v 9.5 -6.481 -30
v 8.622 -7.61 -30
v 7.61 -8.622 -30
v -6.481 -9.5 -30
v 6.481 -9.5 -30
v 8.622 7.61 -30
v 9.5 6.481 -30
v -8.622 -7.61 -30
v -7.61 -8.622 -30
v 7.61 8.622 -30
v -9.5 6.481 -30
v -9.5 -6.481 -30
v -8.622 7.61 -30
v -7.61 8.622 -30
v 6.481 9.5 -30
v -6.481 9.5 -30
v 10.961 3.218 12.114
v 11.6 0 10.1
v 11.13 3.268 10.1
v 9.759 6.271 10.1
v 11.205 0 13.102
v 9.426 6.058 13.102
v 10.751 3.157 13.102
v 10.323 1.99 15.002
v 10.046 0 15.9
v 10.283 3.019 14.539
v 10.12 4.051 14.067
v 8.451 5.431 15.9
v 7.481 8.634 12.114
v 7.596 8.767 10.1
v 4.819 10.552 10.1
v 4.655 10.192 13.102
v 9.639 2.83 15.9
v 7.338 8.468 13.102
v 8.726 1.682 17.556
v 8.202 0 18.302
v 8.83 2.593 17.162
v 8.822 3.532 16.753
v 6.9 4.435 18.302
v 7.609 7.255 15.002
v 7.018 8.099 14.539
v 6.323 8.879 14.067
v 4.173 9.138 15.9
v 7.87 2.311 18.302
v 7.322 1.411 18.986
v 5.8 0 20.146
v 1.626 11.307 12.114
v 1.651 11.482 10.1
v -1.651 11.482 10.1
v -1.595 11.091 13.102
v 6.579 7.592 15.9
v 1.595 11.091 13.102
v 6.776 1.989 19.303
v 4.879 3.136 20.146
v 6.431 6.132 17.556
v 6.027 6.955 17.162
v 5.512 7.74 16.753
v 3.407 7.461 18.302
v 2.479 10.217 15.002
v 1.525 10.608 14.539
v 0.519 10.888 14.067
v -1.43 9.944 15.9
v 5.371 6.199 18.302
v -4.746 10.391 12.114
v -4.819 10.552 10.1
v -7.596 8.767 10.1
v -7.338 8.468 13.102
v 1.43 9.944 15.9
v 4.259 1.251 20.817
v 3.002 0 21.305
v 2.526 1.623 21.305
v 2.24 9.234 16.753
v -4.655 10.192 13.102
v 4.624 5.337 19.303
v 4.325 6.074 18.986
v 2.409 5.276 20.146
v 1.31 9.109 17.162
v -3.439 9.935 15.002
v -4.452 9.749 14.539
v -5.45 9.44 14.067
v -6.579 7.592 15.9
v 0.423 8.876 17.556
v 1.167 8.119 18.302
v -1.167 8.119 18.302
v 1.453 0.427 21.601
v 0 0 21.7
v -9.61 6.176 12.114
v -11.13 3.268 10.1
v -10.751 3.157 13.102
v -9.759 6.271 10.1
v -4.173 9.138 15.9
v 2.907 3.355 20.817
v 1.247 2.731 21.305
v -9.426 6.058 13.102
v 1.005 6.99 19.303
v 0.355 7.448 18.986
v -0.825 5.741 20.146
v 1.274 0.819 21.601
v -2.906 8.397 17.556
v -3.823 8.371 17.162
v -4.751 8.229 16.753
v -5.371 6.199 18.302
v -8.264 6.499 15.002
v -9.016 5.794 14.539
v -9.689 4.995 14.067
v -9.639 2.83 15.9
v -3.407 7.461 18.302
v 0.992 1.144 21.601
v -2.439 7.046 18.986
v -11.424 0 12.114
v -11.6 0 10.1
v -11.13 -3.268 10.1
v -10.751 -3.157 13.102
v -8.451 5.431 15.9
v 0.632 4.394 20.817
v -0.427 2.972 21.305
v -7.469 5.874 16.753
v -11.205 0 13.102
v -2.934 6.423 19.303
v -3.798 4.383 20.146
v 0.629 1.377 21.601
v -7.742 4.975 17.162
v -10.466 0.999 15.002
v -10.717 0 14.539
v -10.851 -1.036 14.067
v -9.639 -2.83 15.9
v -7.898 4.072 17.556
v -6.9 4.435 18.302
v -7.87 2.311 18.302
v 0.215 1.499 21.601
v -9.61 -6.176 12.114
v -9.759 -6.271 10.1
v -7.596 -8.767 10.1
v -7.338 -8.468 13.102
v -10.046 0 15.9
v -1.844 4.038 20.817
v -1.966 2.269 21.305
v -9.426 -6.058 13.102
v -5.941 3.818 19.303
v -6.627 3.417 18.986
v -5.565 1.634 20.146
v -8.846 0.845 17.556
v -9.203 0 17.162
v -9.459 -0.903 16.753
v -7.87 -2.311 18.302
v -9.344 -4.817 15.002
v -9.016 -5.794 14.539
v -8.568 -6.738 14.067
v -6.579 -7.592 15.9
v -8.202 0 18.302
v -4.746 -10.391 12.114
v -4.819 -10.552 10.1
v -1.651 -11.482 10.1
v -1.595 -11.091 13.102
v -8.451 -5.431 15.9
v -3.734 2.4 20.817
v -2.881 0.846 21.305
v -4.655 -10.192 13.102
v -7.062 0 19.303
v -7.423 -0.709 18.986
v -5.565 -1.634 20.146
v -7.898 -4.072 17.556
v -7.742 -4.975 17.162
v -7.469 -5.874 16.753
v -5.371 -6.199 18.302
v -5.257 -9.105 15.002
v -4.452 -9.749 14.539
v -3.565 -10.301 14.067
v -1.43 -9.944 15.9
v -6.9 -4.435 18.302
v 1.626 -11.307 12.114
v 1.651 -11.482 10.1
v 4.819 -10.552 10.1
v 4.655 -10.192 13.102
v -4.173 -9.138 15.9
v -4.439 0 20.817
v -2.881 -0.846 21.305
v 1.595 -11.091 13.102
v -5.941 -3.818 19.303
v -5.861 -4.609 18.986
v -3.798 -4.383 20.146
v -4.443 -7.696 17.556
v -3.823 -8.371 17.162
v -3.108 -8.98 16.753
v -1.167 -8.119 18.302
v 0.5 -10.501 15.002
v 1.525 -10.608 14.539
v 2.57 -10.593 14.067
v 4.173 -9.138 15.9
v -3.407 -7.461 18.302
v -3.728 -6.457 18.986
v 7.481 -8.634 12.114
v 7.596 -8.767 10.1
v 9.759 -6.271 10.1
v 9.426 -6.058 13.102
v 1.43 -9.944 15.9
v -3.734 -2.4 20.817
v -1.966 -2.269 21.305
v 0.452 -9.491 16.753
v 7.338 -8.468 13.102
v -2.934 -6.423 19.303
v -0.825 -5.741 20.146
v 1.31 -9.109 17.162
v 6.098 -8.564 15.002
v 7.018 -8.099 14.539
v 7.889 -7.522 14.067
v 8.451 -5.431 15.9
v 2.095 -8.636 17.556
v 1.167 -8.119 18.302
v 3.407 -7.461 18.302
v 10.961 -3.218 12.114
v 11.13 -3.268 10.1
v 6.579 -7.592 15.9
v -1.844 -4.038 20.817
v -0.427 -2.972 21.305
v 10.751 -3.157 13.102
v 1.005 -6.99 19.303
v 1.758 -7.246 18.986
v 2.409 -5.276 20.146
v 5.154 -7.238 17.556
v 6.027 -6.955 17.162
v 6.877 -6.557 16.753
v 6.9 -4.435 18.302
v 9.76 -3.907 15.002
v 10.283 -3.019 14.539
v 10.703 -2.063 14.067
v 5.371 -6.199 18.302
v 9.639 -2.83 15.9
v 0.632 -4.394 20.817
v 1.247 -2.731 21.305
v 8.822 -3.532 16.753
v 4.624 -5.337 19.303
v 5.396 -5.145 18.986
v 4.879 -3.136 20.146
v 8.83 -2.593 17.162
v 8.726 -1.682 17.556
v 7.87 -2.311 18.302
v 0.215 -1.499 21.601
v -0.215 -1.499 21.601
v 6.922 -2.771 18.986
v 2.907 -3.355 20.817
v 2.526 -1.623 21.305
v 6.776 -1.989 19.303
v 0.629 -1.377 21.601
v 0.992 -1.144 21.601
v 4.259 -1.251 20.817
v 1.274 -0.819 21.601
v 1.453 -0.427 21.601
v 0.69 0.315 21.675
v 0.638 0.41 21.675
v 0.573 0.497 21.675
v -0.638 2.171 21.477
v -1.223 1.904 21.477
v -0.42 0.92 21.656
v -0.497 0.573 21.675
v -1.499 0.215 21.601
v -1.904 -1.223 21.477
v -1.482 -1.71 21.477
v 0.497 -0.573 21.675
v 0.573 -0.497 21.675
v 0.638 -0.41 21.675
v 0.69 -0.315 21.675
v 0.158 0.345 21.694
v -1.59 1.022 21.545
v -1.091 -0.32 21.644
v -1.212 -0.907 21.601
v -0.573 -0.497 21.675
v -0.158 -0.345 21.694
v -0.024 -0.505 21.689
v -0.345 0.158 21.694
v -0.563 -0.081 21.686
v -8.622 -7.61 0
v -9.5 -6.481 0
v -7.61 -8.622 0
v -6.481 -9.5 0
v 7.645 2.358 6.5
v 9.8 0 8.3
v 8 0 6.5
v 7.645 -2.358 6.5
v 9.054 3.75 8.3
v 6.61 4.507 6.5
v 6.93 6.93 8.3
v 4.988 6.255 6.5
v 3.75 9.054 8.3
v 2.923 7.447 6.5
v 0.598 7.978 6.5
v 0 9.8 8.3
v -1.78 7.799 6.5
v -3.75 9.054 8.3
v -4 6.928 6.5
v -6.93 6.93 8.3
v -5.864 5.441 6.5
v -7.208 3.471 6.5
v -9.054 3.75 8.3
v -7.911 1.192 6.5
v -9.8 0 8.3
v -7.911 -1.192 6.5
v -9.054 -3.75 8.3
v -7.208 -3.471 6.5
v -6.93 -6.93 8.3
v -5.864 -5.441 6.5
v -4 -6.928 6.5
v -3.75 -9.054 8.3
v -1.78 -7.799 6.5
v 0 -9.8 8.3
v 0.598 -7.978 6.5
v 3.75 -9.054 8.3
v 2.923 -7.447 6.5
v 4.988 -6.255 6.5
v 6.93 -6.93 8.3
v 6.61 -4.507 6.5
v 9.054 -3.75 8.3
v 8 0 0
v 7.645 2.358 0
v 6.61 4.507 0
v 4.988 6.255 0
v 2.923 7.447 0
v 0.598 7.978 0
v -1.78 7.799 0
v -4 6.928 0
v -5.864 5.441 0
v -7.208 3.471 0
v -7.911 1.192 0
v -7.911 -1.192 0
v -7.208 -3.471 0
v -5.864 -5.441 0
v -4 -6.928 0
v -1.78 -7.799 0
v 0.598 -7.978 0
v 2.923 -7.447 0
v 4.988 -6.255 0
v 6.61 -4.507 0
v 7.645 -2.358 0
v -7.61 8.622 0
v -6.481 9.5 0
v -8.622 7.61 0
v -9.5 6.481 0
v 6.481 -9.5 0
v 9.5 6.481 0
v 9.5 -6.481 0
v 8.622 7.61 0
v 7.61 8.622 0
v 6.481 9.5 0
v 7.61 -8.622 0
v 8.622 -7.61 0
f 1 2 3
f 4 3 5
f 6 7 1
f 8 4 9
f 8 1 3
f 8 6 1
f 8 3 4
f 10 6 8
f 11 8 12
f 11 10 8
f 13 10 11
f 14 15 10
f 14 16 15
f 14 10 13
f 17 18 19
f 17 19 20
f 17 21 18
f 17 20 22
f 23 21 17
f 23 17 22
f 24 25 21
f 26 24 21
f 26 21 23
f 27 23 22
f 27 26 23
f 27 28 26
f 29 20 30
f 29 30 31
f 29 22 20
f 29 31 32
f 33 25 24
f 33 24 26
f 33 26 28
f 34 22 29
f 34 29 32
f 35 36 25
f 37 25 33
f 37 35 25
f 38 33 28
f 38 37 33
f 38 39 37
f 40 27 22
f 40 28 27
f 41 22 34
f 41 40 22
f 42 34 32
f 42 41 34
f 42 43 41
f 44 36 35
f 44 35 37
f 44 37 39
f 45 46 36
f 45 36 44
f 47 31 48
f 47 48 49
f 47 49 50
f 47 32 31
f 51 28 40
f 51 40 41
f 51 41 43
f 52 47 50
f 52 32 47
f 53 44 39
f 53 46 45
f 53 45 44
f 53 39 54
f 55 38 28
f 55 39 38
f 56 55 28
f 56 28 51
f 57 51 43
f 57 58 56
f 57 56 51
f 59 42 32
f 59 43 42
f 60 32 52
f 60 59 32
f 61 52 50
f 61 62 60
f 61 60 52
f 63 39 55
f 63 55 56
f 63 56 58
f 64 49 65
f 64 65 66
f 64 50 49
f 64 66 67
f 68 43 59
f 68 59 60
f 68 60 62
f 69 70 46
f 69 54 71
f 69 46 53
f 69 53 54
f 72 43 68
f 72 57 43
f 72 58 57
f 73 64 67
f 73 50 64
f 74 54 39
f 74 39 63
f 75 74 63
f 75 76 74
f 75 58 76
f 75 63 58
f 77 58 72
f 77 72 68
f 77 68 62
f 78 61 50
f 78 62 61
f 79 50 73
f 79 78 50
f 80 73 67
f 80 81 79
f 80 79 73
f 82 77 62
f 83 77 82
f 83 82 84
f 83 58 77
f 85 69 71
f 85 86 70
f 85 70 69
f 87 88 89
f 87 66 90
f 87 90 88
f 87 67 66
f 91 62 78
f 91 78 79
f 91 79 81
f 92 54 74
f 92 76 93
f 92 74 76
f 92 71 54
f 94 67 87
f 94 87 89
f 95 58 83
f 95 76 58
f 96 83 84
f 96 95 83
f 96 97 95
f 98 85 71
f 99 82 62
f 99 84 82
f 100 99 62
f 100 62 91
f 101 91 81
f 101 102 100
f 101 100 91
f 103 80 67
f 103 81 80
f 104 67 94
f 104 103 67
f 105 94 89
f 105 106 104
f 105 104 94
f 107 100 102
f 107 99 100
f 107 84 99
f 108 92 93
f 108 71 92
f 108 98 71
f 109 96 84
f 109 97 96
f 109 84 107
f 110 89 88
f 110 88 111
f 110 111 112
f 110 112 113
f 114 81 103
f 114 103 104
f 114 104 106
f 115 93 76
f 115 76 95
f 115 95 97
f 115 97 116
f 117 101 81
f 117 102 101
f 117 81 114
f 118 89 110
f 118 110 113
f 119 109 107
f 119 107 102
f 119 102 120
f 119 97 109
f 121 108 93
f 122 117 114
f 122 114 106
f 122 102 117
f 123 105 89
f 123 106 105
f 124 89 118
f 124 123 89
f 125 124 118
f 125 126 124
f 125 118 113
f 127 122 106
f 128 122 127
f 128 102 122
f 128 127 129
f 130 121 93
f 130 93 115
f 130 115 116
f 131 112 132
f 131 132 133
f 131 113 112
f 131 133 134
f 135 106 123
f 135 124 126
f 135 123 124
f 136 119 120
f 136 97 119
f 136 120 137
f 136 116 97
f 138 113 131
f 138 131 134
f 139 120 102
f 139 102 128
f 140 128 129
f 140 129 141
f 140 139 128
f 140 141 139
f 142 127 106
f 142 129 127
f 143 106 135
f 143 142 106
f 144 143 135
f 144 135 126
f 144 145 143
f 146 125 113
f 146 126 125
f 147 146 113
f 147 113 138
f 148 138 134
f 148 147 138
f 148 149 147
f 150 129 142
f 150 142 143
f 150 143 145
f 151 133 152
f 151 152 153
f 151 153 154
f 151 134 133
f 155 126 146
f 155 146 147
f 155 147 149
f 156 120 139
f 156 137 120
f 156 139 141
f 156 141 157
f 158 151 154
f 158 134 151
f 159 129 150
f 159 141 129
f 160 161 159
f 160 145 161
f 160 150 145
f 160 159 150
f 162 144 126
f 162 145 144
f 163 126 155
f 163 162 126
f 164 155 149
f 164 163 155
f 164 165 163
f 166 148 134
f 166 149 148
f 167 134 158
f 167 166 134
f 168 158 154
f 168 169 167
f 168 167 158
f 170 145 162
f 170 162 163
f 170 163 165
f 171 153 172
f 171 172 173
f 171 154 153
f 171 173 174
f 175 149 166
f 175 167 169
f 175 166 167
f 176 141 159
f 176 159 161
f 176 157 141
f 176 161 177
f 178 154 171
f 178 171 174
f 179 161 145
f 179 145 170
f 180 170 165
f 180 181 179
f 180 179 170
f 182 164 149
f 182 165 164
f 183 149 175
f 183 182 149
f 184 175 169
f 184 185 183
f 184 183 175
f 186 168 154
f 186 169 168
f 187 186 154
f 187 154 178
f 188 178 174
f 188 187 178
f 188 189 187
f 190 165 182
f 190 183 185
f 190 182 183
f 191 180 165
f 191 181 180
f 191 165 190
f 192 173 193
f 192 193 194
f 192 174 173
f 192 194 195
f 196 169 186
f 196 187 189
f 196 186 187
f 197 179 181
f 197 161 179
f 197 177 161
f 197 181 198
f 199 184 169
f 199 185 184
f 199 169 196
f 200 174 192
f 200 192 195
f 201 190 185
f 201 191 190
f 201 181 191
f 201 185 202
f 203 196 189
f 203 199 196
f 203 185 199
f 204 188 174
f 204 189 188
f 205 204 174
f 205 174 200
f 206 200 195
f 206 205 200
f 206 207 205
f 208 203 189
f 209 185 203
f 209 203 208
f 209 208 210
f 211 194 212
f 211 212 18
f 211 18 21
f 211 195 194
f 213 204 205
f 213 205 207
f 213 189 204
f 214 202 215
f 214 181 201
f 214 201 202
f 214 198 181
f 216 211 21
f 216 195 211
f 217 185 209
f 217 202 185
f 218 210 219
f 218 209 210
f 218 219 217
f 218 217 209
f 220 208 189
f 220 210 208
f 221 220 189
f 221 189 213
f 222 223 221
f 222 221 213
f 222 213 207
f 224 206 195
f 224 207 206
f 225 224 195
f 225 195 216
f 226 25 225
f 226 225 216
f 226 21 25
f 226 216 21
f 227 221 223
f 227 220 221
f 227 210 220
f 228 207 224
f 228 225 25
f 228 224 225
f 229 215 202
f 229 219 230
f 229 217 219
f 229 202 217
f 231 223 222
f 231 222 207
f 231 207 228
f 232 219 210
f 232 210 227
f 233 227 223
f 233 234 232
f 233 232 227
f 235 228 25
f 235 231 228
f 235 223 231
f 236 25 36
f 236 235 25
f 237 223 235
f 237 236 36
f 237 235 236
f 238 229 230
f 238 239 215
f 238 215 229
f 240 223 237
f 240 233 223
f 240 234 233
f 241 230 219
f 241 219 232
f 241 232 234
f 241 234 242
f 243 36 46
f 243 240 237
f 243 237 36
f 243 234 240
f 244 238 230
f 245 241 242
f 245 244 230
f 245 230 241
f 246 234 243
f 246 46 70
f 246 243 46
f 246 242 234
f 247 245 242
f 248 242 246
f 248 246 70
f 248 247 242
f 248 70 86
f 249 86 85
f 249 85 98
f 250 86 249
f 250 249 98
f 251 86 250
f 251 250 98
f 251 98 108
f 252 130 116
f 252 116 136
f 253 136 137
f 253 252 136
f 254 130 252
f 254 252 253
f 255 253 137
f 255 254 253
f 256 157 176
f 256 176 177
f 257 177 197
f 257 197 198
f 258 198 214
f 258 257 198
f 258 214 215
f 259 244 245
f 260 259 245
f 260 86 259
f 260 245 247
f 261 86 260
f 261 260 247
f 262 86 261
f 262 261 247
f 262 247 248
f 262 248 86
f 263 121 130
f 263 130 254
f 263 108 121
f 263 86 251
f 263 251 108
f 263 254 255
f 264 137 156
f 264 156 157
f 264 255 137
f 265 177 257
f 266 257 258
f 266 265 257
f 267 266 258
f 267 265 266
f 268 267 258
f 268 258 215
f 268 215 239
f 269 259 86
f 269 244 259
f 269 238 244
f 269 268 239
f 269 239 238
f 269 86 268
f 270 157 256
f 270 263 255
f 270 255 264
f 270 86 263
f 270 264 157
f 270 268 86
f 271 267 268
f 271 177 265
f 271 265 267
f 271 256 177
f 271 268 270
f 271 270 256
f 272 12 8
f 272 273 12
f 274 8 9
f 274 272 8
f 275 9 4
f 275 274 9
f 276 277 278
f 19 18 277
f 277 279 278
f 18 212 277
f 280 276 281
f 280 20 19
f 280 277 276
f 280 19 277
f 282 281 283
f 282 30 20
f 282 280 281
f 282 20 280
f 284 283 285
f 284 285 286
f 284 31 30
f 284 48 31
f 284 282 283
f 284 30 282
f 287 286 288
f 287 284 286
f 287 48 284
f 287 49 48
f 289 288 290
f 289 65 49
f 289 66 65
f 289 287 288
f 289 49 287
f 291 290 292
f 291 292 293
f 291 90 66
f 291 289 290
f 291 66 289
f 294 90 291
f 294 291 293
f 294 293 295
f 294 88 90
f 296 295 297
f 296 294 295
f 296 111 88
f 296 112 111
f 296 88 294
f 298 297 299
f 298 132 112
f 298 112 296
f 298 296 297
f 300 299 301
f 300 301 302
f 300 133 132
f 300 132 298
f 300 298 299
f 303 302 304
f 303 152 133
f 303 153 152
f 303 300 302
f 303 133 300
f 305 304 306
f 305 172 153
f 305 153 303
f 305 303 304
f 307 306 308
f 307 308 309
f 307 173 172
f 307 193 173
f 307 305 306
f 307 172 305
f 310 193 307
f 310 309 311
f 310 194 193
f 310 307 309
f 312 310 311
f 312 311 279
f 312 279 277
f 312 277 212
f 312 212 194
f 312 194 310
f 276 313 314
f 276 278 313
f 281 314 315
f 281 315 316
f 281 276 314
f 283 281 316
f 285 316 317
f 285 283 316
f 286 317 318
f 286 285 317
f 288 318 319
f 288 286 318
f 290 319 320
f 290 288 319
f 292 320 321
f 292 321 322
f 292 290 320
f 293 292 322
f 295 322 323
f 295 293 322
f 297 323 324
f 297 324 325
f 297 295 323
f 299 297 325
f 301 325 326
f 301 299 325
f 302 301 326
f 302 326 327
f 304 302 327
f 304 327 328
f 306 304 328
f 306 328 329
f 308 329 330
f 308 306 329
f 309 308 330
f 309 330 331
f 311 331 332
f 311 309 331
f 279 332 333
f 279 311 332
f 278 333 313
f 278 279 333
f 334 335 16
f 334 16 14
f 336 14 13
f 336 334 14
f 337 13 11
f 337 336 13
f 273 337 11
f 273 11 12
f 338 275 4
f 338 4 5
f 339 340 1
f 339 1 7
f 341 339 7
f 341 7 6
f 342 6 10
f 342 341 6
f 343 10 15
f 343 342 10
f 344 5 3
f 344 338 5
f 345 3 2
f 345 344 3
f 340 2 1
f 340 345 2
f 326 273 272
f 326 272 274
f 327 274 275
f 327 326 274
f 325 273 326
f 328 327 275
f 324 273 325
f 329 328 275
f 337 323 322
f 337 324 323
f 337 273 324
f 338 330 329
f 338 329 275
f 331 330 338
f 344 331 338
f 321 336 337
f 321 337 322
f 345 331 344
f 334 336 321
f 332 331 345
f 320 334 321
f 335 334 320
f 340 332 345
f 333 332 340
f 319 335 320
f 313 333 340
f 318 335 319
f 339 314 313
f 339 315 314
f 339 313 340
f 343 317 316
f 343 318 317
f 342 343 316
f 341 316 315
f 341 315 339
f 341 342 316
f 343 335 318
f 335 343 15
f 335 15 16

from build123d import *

# Parameters (mm, degrees)
F3_DEPTH = 30


with BuildPart() as f1:
    # F0 (on Front) → F1 (revolve)
    with BuildSketch(Plane.XZ):
        with BuildLine():
            Line((11.5, 0), (8, 0))
            Line((8, 0), (8, 6.5))
            Line((8, 6.5), (11.6, 10.1))
            ThreePointArc((11.6, 10.1), (8.202439, 18.302439), (0, 21.7))
            Line((0, 21.7), (0, 0))
            Line((0, 0), (0, -30))
            Line((0, -30), (11.5, -30))
            Line((11.5, -30), (11.5, 0))
        make_face()
    revolve(axis=Axis((0, 0, 10.85), (0, 0, 1)))

    # F2 (on face) → F3 (cut)
    with BuildSketch(Plane(origin=(0, 0, -30), x_dir=(1, 0, 0), z_dir=(0, 0, -1))):
        with BuildLine():
            Line((-6.480741, 9.5), (6.480741, 9.5))
            ThreePointArc((6.480741, 9.5), (0, 11.5), (-6.480741, 9.5))
        make_face()
        with BuildLine():
            Line((9.5, 6.480741), (9.5, 0))
            Line((9.5, 0), (9.5, -6.480741))
            ThreePointArc((9.5, -6.480741), (10.98863, -3.391165), (11.5, 0))
            ThreePointArc((11.5, 0), (10.98863, 3.391165), (9.5, 6.480741))
        make_face()
        with BuildLine():
            Line((-9.5, -6.480741), (-9.5, 6.480741))
            ThreePointArc((-9.5, 6.480741), (-11.5, 0), (-9.5, -6.480741))
        make_face()
        with BuildLine():
            ThreePointArc((-6.480741, -9.5), (0, -11.5), (6.480741, -9.5))
            Line((6.480741, -9.5), (-6.480741, -9.5))
        make_face()
    extrude(amount=-F3_DEPTH, mode=Mode.SUBTRACT)


solid = f1.part
